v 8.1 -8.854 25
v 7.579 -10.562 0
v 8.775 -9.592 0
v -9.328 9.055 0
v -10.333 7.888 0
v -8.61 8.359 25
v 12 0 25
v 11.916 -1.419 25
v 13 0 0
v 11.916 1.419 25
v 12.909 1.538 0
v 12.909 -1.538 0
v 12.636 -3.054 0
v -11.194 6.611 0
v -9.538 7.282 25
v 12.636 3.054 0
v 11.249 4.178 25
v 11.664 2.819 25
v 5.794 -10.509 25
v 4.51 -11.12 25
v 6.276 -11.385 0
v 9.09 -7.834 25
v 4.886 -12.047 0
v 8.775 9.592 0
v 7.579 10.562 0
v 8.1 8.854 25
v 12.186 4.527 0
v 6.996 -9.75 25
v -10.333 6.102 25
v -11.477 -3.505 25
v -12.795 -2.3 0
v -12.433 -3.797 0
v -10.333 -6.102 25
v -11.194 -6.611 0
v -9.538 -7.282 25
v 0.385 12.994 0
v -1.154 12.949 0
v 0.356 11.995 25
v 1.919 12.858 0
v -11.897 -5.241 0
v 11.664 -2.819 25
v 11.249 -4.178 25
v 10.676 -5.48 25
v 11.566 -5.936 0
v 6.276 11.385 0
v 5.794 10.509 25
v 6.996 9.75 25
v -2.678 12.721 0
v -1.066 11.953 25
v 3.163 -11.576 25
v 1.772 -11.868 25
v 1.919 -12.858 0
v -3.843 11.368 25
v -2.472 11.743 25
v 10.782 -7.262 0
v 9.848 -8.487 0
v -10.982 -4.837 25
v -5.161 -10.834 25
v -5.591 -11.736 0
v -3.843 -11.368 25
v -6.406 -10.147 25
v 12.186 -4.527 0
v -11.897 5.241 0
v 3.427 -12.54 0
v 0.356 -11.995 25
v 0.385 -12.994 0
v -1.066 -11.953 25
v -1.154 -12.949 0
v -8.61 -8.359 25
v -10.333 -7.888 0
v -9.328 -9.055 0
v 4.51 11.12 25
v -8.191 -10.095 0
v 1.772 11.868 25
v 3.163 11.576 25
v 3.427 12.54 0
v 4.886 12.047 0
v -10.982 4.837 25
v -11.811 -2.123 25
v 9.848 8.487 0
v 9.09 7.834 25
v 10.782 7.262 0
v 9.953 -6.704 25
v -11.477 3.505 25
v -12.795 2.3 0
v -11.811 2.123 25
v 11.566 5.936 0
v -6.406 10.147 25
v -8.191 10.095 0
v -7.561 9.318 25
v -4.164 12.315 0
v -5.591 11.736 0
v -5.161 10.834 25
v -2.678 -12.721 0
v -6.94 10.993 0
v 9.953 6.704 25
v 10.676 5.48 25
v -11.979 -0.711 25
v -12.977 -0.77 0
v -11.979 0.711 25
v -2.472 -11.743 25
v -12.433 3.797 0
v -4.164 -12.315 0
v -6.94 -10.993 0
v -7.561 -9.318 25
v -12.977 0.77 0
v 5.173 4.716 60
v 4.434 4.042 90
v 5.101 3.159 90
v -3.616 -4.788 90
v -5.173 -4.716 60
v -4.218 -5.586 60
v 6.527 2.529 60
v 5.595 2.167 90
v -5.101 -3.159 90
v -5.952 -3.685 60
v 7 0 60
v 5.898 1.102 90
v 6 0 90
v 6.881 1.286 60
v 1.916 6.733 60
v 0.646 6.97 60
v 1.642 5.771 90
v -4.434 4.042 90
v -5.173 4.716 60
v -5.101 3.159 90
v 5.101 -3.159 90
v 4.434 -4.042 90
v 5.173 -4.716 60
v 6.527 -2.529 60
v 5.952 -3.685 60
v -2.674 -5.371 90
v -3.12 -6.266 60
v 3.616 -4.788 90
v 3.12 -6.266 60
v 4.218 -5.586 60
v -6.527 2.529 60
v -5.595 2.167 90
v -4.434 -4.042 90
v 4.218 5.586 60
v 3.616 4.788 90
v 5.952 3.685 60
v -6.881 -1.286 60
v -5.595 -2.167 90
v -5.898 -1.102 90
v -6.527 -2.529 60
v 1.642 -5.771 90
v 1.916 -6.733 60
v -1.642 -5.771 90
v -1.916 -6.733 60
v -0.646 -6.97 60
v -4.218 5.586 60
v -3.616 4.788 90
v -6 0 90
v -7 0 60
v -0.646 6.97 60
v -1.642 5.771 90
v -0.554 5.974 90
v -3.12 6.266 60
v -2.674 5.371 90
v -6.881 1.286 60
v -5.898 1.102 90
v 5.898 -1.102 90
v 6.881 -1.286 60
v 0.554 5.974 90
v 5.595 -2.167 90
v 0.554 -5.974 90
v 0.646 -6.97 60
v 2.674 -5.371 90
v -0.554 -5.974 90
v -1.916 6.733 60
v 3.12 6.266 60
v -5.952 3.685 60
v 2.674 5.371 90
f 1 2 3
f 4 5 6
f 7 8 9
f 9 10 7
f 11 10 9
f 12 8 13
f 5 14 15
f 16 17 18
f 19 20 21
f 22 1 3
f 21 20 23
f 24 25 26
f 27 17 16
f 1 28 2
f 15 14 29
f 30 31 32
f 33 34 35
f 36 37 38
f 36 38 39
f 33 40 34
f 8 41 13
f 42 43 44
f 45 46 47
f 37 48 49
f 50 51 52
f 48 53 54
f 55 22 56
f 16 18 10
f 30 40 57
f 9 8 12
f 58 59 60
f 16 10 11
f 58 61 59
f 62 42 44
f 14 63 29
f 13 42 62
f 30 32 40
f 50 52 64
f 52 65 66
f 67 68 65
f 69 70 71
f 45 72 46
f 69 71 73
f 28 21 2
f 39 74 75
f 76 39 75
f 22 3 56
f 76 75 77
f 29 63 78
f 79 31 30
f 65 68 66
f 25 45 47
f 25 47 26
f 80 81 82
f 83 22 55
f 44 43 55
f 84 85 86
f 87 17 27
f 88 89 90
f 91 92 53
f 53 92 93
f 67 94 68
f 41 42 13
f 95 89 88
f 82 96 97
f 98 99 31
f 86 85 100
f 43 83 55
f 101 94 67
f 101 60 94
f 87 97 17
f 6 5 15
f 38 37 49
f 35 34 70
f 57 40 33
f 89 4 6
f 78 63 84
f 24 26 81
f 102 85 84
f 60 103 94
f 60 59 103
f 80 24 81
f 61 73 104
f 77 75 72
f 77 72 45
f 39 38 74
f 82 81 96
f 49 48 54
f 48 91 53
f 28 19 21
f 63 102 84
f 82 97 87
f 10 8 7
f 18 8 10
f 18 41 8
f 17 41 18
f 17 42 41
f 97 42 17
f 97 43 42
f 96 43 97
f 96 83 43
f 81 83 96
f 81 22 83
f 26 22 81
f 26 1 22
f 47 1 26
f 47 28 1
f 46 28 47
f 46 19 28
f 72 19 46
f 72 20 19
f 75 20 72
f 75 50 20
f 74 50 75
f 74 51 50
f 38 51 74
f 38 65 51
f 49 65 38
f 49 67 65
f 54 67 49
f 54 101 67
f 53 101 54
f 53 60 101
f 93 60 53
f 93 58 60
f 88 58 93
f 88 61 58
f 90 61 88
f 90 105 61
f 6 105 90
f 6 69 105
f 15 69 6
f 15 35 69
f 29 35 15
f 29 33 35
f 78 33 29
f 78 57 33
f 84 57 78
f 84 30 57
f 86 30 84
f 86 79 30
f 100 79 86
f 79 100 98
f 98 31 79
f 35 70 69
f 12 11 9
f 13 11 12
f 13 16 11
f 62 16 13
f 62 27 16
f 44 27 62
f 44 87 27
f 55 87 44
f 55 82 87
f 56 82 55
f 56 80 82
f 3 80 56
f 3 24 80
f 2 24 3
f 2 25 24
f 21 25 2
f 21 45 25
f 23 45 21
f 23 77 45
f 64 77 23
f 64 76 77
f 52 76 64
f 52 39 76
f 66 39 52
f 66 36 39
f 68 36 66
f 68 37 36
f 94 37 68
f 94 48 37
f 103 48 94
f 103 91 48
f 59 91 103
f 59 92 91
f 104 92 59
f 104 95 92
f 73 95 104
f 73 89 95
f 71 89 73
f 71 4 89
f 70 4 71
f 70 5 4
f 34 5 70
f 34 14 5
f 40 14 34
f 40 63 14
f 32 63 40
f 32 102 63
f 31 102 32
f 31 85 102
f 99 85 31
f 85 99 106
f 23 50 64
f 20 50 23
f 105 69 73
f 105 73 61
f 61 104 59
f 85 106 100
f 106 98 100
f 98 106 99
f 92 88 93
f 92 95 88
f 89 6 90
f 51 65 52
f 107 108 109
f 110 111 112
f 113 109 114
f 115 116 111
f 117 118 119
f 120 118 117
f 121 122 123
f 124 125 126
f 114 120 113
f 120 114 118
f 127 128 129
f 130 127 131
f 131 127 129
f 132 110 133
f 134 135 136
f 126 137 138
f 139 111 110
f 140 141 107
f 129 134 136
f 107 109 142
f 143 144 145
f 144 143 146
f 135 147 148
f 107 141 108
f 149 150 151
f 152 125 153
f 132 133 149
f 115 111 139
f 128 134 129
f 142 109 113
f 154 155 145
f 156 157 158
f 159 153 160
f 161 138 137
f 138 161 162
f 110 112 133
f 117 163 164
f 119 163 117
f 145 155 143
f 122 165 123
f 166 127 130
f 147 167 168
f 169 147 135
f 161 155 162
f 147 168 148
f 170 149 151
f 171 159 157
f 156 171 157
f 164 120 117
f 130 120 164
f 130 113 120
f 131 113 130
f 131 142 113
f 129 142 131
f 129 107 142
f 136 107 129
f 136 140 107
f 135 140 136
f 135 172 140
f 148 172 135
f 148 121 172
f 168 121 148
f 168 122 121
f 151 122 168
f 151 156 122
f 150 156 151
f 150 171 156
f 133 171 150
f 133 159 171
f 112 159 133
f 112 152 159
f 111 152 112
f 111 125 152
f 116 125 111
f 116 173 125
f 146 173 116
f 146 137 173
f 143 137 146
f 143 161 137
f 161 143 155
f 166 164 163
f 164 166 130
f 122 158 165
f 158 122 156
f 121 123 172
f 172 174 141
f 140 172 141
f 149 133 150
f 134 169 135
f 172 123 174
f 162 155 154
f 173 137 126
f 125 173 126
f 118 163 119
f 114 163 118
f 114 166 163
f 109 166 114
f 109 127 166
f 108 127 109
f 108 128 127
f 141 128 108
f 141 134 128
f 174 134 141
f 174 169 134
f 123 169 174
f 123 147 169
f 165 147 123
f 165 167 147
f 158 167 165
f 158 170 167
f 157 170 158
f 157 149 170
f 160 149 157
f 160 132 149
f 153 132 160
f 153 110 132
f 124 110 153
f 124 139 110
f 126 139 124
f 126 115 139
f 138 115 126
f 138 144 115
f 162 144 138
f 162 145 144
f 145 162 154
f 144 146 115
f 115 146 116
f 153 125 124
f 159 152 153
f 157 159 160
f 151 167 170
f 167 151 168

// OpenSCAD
//------------------------------------------------------------------------------------------
// THIS CODE WAS GENERATED WITH GRAPHSCAD
//------------------------------------------------------------------------------------------
// /home/clt/Downloads/GraphScad/graphscad_ubu_v1.0.7/graphscadfiles/variablesdemoCLT.scad
//------------------------------------------------------------------------------------------
// Graphscad is a graphical nodal editor to create .SCAD files
//
// More info here : http://graphscad.free.fr
//
// Scad Files created with Graphscad can be edited by graphscad
// Scad Files created with Graphscad can be read by Openscad
//
//------------------------------------------------------------------------------------------
module variablesdemoCLT(top2=6,bot2=7,ht2=30)
{
 function node_cylinder_matrix(i=0,j=0,k=0,l=0,m=0,n=0) = translate([0,0,0]);
 module node_cylinder(i=0,j=0,k=0,l=0,m=0,n=0)
 {
  cylinder(r=$top,r1=$bottom,h=$ht,center=false,$fn=(16+$top*3.14116));
 }
 function node_variables_matrix(i=0,j=0,k=0,l=0,m=0,n=0) = node_cylinder_matrix(i=i,j=j,k=k,l=l,m=m,n=n);
 module node_variables(i=0,j=0,k=0,l=0,m=0,n=0)
 {
  {
   $top=12;
   $bottom=13;
   $ht=$top+$bottom;
   node_cylinder(i,j,k,l,m,n);
  }
 }
 function node_cylinder0_matrix(i=0,j=0,k=0,l=0,m=0,n=0) = translate([0,0,ht2*2]);
 module node_cylinder0(i=0,j=0,k=0,l=0,m=0,n=0)
 {
  translate([0,0,ht2*2])cylinder(r=top2,r1=bot2,h=ht2,center=false,$fn=(16+top2*3.14116));
 }
 node_variables();
 node_cylinder0();
 /*--------------------------------------------------------------------------------------------------------
  Graphscad Utils functions
  This code is Used By Graphscad Nodal Editor to generate SCAD files
 --------------------------------------------------------------------------------------------------------*/
 function det4x4(a) =
 a[0][0]*a[1][1]*a[2][2]*a[3][3] + a[0][0]*a[1][2]*a[2][3]*a[3][1] + a[0][0]*a[1][3]*a[2][1]*a[3][2]
 + a[0][1]*a[1][0]*a[2][3]*a[3][2] + a[0][1]*a[1][2]*a[2][0]*a[3][3] + a[0][1]*a[1][3]*a[2][2]*a[3][0]
 + a[0][2]*a[1][0]*a[2][1]*a[3][3] + a[0][2]*a[1][1]*a[2][3]*a[3][0] + a[0][2]*a[1][3]*a[2][0]*a[3][1]
 + a[0][3]*a[1][0]*a[2][2]*a[3][1] + a[0][3]*a[1][1]*a[2][0]*a[3][2] + a[0][3]*a[1][2]*a[2][1]*a[3][0]
 - a[0][0]*a[1][1]*a[2][3]*a[3][2] - a[0][0]*a[1][2]*a[2][1]*a[3][3] - a[0][0]*a[1][3]*a[2][2]*a[3][1]
 - a[0][1]*a[1][0]*a[2][2]*a[3][3] - a[0][1]*a[1][2]*a[2][3]*a[3][0] - a[0][1]*a[1][3]*a[2][0]*a[3][2]
 - a[0][2]*a[1][0]*a[2][3]*a[3][1] - a[0][2]*a[1][1]*a[2][0]*a[3][3] - a[0][2]*a[1][3]*a[2][1]*a[3][0]
 - a[0][3]*a[1][0]*a[2][1]*a[3][2] - a[0][3]*a[1][1]*a[2][2]*a[3][0] - a[0][3]*a[1][2]*a[2][0]*a[3][1];
 function invb00(a) = a[1][1]*a[2][2]*a[3][3] + a[1][2]*a[2][3]*a[3][1] + a[1][3]*a[2][1]*a[3][2] - a[1][1]*a[2][3]*a[3][2] - a[1][2]*a[2][1]*a[3][3] - a[1][3]*a[2][2]*a[3][1];
 function invb01(a) = a[0][1]*a[2][3]*a[3][2] + a[0][2]*a[2][1]*a[3][3] + a[0][3]*a[2][2]*a[3][1] - a[0][1]*a[2][2]*a[3][3] - a[0][2]*a[2][3]*a[3][1] - a[0][3]*a[2][1]*a[3][2];
 function invb02(a) = a[0][1]*a[1][2]*a[3][3] + a[0][2]*a[1][3]*a[3][1] + a[0][3]*a[1][1]*a[3][2] - a[0][1]*a[1][3]*a[3][2] - a[0][2]*a[1][1]*a[3][3] - a[0][3]*a[1][2]*a[3][1];
 function invb03(a) = a[0][1]*a[1][3]*a[2][2] + a[0][2]*a[1][1]*a[2][3] + a[0][3]*a[1][2]*a[2][1] - a[0][1]*a[1][2]*a[2][3] - a[0][2]*a[1][3]*a[2][1] - a[0][3]*a[1][1]*a[2][2];
 function invb10(a) = a[1][0]*a[2][3]*a[3][2] + a[1][2]*a[2][0]*a[3][3] + a[1][3]*a[2][2]*a[3][0] - a[1][0]*a[2][2]*a[3][3] - a[1][2]*a[2][3]*a[3][0] - a[1][3]*a[2][0]*a[3][2];
 function invb11(a) = a[0][0]*a[2][2]*a[3][3] + a[0][2]*a[2][3]*a[3][0] + a[0][3]*a[2][0]*a[3][2] - a[0][0]*a[2][3]*a[3][2] - a[0][2]*a[2][0]*a[3][3] - a[0][3]*a[2][2]*a[3][0];
 function invb12(a) = a[0][0]*a[1][3]*a[3][2] + a[0][2]*a[1][0]*a[3][3] + a[0][3]*a[1][2]*a[3][0] - a[0][0]*a[1][2]*a[3][3] - a[0][2]*a[1][3]*a[3][0] - a[0][3]*a[1][0]*a[3][2];
 function invb13(a) = a[0][0]*a[1][2]*a[2][3] + a[0][2]*a[1][3]*a[2][0] + a[0][3]*a[1][0]*a[2][2] - a[0][0]*a[1][3]*a[2][2] - a[0][2]*a[1][0]*a[2][3] - a[0][3]*a[1][2]*a[2][0];
 function invb20(a) = a[1][0]*a[2][1]*a[3][3] + a[1][1]*a[2][3]*a[3][0] + a[1][3]*a[2][0]*a[3][1] - a[1][0]*a[2][3]*a[3][1] - a[1][1]*a[2][0]*a[3][3] - a[1][3]*a[2][1]*a[3][0];
 function invb21(a) = a[0][0]*a[2][3]*a[3][1] + a[0][1]*a[2][0]*a[3][3] + a[0][3]*a[2][1]*a[3][0] - a[0][0]*a[2][1]*a[3][3] - a[0][1]*a[2][3]*a[3][0] - a[0][3]*a[2][0]*a[3][1];
 function invb22(a) = a[0][0]*a[1][1]*a[3][3] + a[0][1]*a[1][3]*a[3][0] + a[0][3]*a[1][0]*a[3][1] - a[0][0]*a[1][3]*a[3][1] - a[0][1]*a[1][0]*a[3][3] - a[0][3]*a[1][1]*a[3][0];
 function invb23(a) = a[0][0]*a[1][3]*a[2][1] + a[0][1]*a[1][0]*a[2][3] + a[0][3]*a[1][1]*a[2][0] - a[0][0]*a[1][1]*a[2][3] - a[0][1]*a[1][3]*a[2][0] - a[0][3]*a[1][0]*a[2][1];
 function invb30(a) = a[1][0]*a[2][2]*a[3][1] + a[1][1]*a[2][0]*a[3][2] + a[1][2]*a[2][1]*a[3][0] - a[1][0]*a[2][1]*a[3][2] - a[1][1]*a[2][2]*a[3][0] - a[1][2]*a[2][0]*a[3][1];
 function invb31(a) = a[0][0]*a[2][1]*a[3][2] + a[0][1]*a[2][2]*a[3][0] + a[0][2]*a[2][0]*a[3][1] - a[0][0]*a[2][2]*a[3][1] - a[0][1]*a[2][0]*a[3][2] - a[0][2]*a[2][1]*a[3][0];
 function invb32(a) = a[0][0]*a[1][2]*a[3][1] + a[0][1]*a[1][0]*a[3][2] + a[0][2]*a[1][1]*a[3][0] - a[0][0]*a[1][1]*a[3][2] - a[0][1]*a[1][2]*a[3][0] - a[0][2]*a[1][0]*a[3][1];
 function invb33(a) = a[0][0]*a[1][1]*a[2][2] + a[0][1]*a[1][2]*a[2][0] + a[0][2]*a[1][0]*a[2][1] - a[0][0]*a[1][2]*a[2][1] - a[0][1]*a[1][0]*a[2][2] - a[0][2]*a[1][1]*a[2][0];
 function inv4x4(a)= (1/det4x4(a))*[
 [invb00(a),invb01(a),invb02(a),invb03(a)],
 [invb10(a),invb11(a),invb12(a),invb13(a)],
 [invb20(a),invb21(a),invb22(a),invb23(a)],
 [invb30(a),invb31(a),invb32(a),invb33(a)]];
 function onlytranslate(a)=  [
                        [1,0,0,a[0][3]],
                        [0,1,0,a[1][3]],
                        [0,0,1,a[2][3]],
                        [0,0,0,1]];
 function negonlytranslate(a)=[
                        [1,0,0,-a[0][3]],
                        [0,1,0,-a[1][3]],
                        [0,0,1,-a[2][3]],
                        [0,0,0,1]];
 function lookatvec(t,parentmat) = [t[0]-parentmat[0][3],
                                 t[1]-parentmat[1][3],
                                 t[2]-parentmat[2][3]];
 /*
              rx = '0'
              ry = 'acos('+tz+'/norm(['+tx+','+ty+','+tz+']))'
              rz = 'atan2('+ty+','+tx+')'
 */
 function lookatrot(t,parentmat) = [0,
                                 acos((t[2]-parentmat[2][3])/norm(lookatvec(t,parentmat))),
                                 atan2(t[1]-parentmat[1][3],t[0]-parentmat[0][3])];
 function gettranslation(m) = [m[0][3],m[1][3],m[2][3]];
 function vectormulmatrix(v,m) = m*v;
 function vectorlength(v) = norm(v);
 function vectorx(v) = v[0];
 function vectory(v) = v[1];
 function vectorz(v) = v[2];
 function vectoradd(a,b) = (a+b);
 function vectorsub(a,b) = (a-b);
 function vectormul(a,b) = (a*b);
 function vectordiv(a,b) = (a*(1/b));
 function scale(v)=[[v[0],0,0,0],
                    [0,v[1],0,0],
                    [0,0,v[2],0],
                    [0,0,0,1]];
 function rotatex(a)=[[1,0,0,0],
                      [0,cos(a),-sin(a),0],
                      [0,sin(a),cos(a),0],
                      [0,0,0,1]];
 function rotatey(a)=[[cos(a),0,sin(a),0],
                      [0,1,0,0],
                      [-sin(a),0,cos(a),0],
                      [0,0,0,1]];
 function rotatez(a)=[[cos(a),-sin(a),0,0],
                      [sin(a),cos(a),0,0],
                      [0,0,1,0],
                      [0,0,0,1]];
 function rotatea(c,s,l,m,n)=[[l*l*(1-c)+c,m*l*(1-c)-n*s,n*l*(1-c)+m*s,0],
                              [l*m*(1-c)+n*s,m*m*(1-c)+c,n*m*(1-c)-l*s,0],
                              [l*n*(1-c)-m*s,m*n*(1-c)+l*s,n*n*(1-c)+c,0],
                              [0,0,0,1]];
 function rotateanv(a,nv)=rotatea(cos(a),sin(a),nv[0],nv[1],nv[2]);
 function rotate(a,v, normV=true)=(v==undef)?rotatez(a[2])*rotatey(a[1])*rotatex(a[0]):
                      normV ? rotateanv(a,v/sqrt(v*v)) : rotateanv(a,v);
 function translate(v)=[[1,0,0,v[0]],
                        [0,1,0,v[1]],
                        [0,0,1,v[2]],
                        [0,0,0,1]];
 function mirrorabc(a,b,c)=[[1-2*a*a,-2*a*b,-2*a*c,0],
                            [-2*a*b,1-2*b*b,-2*b*c,0],
                            [-2*a*c,-2*b*c,1-2*c*c,0],
                            [0,0,0,1]];
 function mirrornv(nv)=mirrorabc(nv[0],nv[1],nv[2]);
 function mirror(v)=mirrornv(v/sqrt(v*v));
}
variablesdemoCLT();


/*BEGINGRAPHSCAD{
    "nodes": [
        {
            "name": "node_cylinder",
            "inputplugs": [
                {
                    "alias": "top radius",
                    "tip": "top radius of cynlinder",
                    "type": "str",
                    "name": "radius",
                    "value": "$top"
                },
                {
                    "alias": "bottom radius",
                    "tip": "bottom radius of cynlinder",
                    "type": "str",
                    "name": "radius2",
                    "value": "$bottom"
                },
                {
                    "tip": "height of cylinder",
                    "type": "str",
                    "name": "height",
                    "value": "$ht"
                },
                {
                    "tip": "centering of cylinder (on Z axis)",
                    "type": "str",
                    "name": "center",
                    "value": "false",
                    "combo": [
                        "true",
                        "false"
                    ]
                },
                {
                    "tip": "x translation of output object",
                    "type": "str",
                    "name": "tx",
                    "value": "0"
                },
                {
                    "tip": "y translation of output object",
                    "type": "str",
                    "name": "ty",
                    "value": "0"
                },
                {
                    "tip": "z translation of output object",
                    "type": "str",
                    "name": "tz",
                    "value": "0"
                },
                {
                    "tip": "",
                    "type": "str",
                    "name": "$fn",
                    "value": ""
                }
            ],
            "typename": "Node_cylinder",
            "version": 1,
            "y": 0.25,
            "x": -187.0
        },
        {
            "name": "node_variables",
            "inputplugs": [
                {
                    "tip": "input 3D object",
                    "connection": "node_cylinder.object",
                    "type": "object",
                    "name": "object",
                    "value": ""
                },
                {
                    "tip": "vame of variable to declare",
                    "prefix": "$",
                    "type": "str",
                    "name": "name1",
                    "value": "$top"
                },
                {
                    "tip": "expression of variable value",
                    "type": "str",
                    "name": "expression1",
                    "value": "12"
                },
                {
                    "tip": "vame of variable to declare",
                    "prefix": "$",
                    "type": "str",
                    "name": "name2",
                    "value": "$bottom"
                },
                {
                    "tip": "expression of variable value",
                    "type": "str",
                    "name": "expression2",
                    "value": "13"
                },
                {
                    "tip": "vame of variable to declare",
                    "prefix": "$",
                    "type": "str",
                    "name": "name3",
                    "value": "$ht"
                },
                {
                    "tip": "expression of variable value",
                    "type": "str",
                    "name": "expression3",
                    "value": "$top+$bottom"
                },
                {
                    "tip": "vame of variable to declare",
                    "prefix": "$",
                    "type": "str",
                    "name": "name4",
                    "value": ""
                },
                {
                    "tip": "expression of variable value",
                    "type": "str",
                    "name": "expression4",
                    "value": ""
                },
                {
                    "tip": "vame of variable to declare",
                    "prefix": "$",
                    "type": "str",
                    "name": "name5",
                    "value": ""
                },
                {
                    "tip": "expression of variable value",
                    "type": "str",
                    "name": "expression5",
                    "value": ""
                },
                {
                    "tip": "vame of variable to declare",
                    "prefix": "$",
                    "type": "str",
                    "name": "name6",
                    "value": ""
                },
                {
                    "tip": "expression of variable value",
                    "type": "str",
                    "name": "expression6",
                    "value": ""
                },
                {
                    "tip": "vame of variable to declare",
                    "prefix": "$",
                    "type": "str",
                    "name": "name7",
                    "value": ""
                },
                {
                    "tip": "expression of variable value",
                    "type": "str",
                    "name": "expression7",
                    "value": ""
                },
                {
                    "tip": "vame of variable to declare",
                    "prefix": "$",
                    "type": "str",
                    "name": "name8",
                    "value": ""
                },
                {
                    "tip": "expression of variable value",
                    "type": "str",
                    "name": "expression8",
                    "value": ""
                },
                {
                    "tip": "vame of variable to declare",
                    "prefix": "$",
                    "type": "str",
                    "name": "name9",
                    "value": ""
                },
                {
                    "tip": "expression of variable value",
                    "type": "str",
                    "name": "expression9",
                    "value": ""
                },
                {
                    "tip": "vame of variable to declare",
                    "prefix": "$",
                    "type": "str",
                    "name": "name10",
                    "value": ""
                },
                {
                    "tip": "expression of variable value",
                    "type": "str",
                    "name": "expression10",
                    "value": ""
                }
            ],
            "typename": "Node_variables",
            "version": 1,
            "y": 10.75,
            "x": 113.5
        },
        {
            "name": "node_comment",
            "inputplugs": [
                {
                    "tip": "comment string to display on background",
                    "type": "str",
                    "name": "comment",
                    "value": "Example of variables node.\nIt creates 'special variables' with $names\nwhich can be used as parameters of the input object\nor its input(s)"
                }
            ],
            "typename": "Node_comment",
            "version": 1,
            "y": -95.86230468750003,
            "x": -59.1826171875
        },
        {
            "name": "node_cylinder0",
            "inputplugs": [
                {
                    "alias": "top radius",
                    "tip": "top radius of cynlinder",
                    "type": "str",
                    "name": "radius",
                    "value": "top2"
                },
                {
                    "alias": "bottom radius",
                    "tip": "bottom radius of cynlinder",
                    "type": "str",
                    "name": "radius2",
                    "value": "bot2"
                },
                {
                    "tip": "height of cylinder",
                    "type": "str",
                    "name": "height",
                    "value": "ht2"
                },
                {
                    "tip": "centering of cylinder (on Z axis)",
                    "type": "str",
                    "name": "center",
                    "value": "false",
                    "combo": [
                        "true",
                        "false"
                    ]
                },
                {
                    "tip": "x translation of output object",
                    "type": "str",
                    "name": "tx",
                    "value": "0"
                },
                {
                    "tip": "y translation of output object",
                    "type": "str",
                    "name": "ty",
                    "value": "0"
                },
                {
                    "tip": "z translation of output object",
                    "type": "str",
                    "name": "tz",
                    "value": "ht2*2"
                },
                {
                    "tip": "",
                    "type": "str",
                    "name": "$fn",
                    "value": ""
                }
            ],
            "typename": "Node_cylinder",
            "version": 1,
            "y": 25.18749999999997,
            "x": 929.5624999999999
        },
        {
            "name": "node_param",
            "inputplugs": [
                {
                    "type": "param",
                    "name": "previousparam",
                    "value": ""
                },
                {
                    "type": "str",
                    "name": "name",
                    "value": "top2"
                },
                {
                    "type": "str",
                    "name": "string",
                    "value": "6"
                }
            ],
            "typename": "Node_param",
            "version": 1,
            "y": 7.999999999999972,
            "x": 493.6249999999999
        },
        {
            "name": "node_param0",
            "inputplugs": [
                {
                    "connection": "node_param.nextparam",
                    "type": "param",
                    "name": "previousparam",
                    "value": ""
                },
                {
                    "type": "str",
                    "name": "name",
                    "value": "bot2"
                },
                {
                    "type": "str",
                    "name": "string",
                    "value": "7"
                }
            ],
            "typename": "Node_param",
            "version": 1,
            "y": 176.74999999999994,
            "x": 493.6249999999999
        },
        {
            "name": "node_param1",
            "inputplugs": [
                {
                    "connection": "node_param0.nextparam",
                    "type": "param",
                    "name": "previousparam",
                    "value": ""
                },
                {
                    "type": "str",
                    "name": "name",
                    "value": "ht2"
                },
                {
                    "type": "str",
                    "name": "string",
                    "value": "30"
                }
            ],
            "typename": "Node_param",
            "version": 1,
            "y": 348.62500000000006,
            "x": 493.6249999999999
        },
        {
            "name": "node_comment0",
            "inputplugs": [
                {
                    "tip": "comment string to display on background",
                    "type": "str",
                    "name": "comment",
                    "value": "Here's how it can be done with globals\nThey can be used anywhere in the model."
                }
            ],
            "typename": "Node_comment",
            "version": 1,
            "y": -60.31054687499977,
            "x": 500.16796875
        }
    ],
    "version": 2
}ENDGRAPHSCAD*/
